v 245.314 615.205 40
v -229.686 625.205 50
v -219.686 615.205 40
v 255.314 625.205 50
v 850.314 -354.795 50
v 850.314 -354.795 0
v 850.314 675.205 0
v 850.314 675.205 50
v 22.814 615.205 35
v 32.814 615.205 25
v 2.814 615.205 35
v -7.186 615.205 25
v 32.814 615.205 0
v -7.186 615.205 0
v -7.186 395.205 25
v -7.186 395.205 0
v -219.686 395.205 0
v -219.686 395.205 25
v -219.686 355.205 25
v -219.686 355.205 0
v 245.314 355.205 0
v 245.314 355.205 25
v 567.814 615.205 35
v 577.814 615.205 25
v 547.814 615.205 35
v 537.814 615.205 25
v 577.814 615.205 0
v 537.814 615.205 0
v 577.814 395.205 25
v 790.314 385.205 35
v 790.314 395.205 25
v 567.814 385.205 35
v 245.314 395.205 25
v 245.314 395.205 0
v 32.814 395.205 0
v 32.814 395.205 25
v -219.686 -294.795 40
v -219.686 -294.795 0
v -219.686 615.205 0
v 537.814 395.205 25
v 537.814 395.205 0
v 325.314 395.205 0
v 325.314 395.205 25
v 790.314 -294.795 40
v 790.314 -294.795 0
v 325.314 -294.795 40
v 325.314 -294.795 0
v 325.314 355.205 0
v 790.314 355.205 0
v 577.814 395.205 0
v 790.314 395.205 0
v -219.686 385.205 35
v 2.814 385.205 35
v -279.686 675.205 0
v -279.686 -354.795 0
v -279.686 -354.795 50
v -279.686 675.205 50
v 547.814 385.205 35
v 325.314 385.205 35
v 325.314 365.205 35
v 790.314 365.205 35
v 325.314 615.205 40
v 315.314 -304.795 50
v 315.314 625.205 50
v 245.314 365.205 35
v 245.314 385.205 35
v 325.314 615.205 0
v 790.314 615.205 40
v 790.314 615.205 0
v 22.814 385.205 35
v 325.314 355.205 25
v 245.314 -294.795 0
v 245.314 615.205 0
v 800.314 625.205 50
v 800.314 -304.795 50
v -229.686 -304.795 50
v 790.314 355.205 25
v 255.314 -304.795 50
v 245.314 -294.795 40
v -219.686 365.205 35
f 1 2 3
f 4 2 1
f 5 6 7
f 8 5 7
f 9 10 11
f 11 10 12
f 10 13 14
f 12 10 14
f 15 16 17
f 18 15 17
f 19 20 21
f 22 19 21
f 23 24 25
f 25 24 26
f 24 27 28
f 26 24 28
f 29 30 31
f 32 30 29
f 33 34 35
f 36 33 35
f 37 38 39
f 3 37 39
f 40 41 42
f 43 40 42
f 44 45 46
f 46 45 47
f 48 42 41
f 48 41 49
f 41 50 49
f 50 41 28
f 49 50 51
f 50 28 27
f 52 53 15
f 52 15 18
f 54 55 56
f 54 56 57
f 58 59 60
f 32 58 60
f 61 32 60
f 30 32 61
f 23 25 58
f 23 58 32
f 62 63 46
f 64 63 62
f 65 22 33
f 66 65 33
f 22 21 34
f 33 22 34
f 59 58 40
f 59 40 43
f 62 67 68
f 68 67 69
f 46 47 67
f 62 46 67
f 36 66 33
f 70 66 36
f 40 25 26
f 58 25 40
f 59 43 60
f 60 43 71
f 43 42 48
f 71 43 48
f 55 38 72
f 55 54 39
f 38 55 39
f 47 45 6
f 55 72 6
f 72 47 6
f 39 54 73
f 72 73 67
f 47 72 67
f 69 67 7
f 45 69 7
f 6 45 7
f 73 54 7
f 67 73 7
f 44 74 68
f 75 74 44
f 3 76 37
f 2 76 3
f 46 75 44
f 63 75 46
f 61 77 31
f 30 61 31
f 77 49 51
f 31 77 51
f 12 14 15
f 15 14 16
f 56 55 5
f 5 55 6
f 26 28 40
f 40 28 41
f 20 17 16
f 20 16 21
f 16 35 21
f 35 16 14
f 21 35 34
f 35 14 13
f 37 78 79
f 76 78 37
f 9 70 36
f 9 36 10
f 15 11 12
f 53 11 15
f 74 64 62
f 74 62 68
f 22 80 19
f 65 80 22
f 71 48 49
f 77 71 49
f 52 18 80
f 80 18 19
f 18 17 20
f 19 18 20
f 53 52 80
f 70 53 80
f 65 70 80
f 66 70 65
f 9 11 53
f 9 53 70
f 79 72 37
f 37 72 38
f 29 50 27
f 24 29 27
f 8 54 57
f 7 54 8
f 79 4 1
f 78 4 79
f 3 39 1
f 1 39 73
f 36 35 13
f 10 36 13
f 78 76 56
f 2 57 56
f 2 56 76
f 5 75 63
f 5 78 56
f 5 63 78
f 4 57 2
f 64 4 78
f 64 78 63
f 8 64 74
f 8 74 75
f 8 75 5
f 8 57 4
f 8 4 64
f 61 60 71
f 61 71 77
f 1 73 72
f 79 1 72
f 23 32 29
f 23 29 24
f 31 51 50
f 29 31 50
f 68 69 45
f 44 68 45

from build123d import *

# Parameters (mm, degrees)
F0_W      = 1130
F0_H      = 1030
F1_DEPTH  = 50
F2_DEPTH  = 35
F3_SIZE   = 10
F3_2_SIZE = 10
F3_3_SIZE = 10


with BuildPart() as f1:
    # F0 (on Top) → F1 (new body)
    with BuildSketch(Plane.XY):
        with Locations((285.3141621128, 160.2047318473)):
            Rectangle(F0_W, F0_H)
        Polygon((-219.6858378872, -294.7952681527), (-219.6858378872, 355.2047318473), (-219.6858378872, 395.2047318473), (-219.6858378872, 615.2047318473), (-7.1858378872, 615.2047318473), (32.8141621128, 615.2047318473), (245.3141621128, 615.2047318473), (245.3141621128, 395.2047318473), (245.3141621128, 355.2047318473), (245.3141621128, -294.7952681527), align=None, mode=Mode.SUBTRACT)
        Polygon((325.3141621128, -294.7952681527), (325.3141621128, 355.2047318473), (325.3141621128, 395.2047318473), (325.3141621128, 615.2047318473), (537.8141621128, 615.2047318473), (577.8141621128, 615.2047318473), (790.3141621128, 615.2047318473), (790.3141621128, 395.2047318473), (790.3141621128, 355.2047318473), (790.3141621128, -294.7952681527), align=None, mode=Mode.SUBTRACT)
    extrude(amount=F1_DEPTH)

    # F3
    f3_edges = [f1.edges().sort_by_distance(p)[0] for p in [
        (-219.685838, 160.204732, 50),
        (12.814162, 615.204732, 50),
        (245.314162, 160.204732, 50),
        (325.314162, 160.204732, 50),
        (557.814162, 615.204732, 50),
        (790.314162, 160.204732, 50),
        (557.814162, -294.795268, 50),
        (12.814162, -294.795268, 50),
    ]]
    chamfer(f3_edges, length=F3_SIZE)


with BuildPart() as f2:
    # F0 (on Top) → F2 (new body)
    with BuildSketch(Plane.XY):
        Polygon((-219.6858378872, 395.2047318473), (-219.6858378872, 355.2047318473), (245.3141621128, 355.2047318473), (245.3141621128, 395.2047318473), (32.8141621128, 395.2047318473), (32.8141621128, 615.2047318473), (-7.1858378872, 615.2047318473), (-7.1858378872, 395.2047318473), align=None)
    extrude(amount=F2_DEPTH)

    # F3#2
    f3_2_edges = [f2.edges().sort_by_distance(p)[0] for p in [
        (12.814162, 355.204732, 35),
        (139.064162, 395.204732, 35),
        (32.814162, 505.204732, 35),
        (-7.185838, 505.204732, 35),
        (-113.435838, 395.204732, 35),
    ]]
    chamfer(f3_2_edges, length=F3_2_SIZE)


with BuildPart() as f2b:
    # F0 (on Top) → F2, piece 2 (new body)
    with BuildSketch(Plane.XY):
        Polygon((325.3141621128, 395.2047318473), (325.3141621128, 355.2047318473), (790.3141621128, 355.2047318473), (790.3141621128, 395.2047318473), (577.8141621128, 395.2047318473), (577.8141621128, 615.2047318473), (537.8141621128, 615.2047318473), (537.8141621128, 395.2047318473), align=None)
    extrude(amount=F2_DEPTH)

    # F3#3
    f3_3_edges = [f2b.edges().sort_by_distance(p)[0] for p in [
        (557.814162, 355.204732, 35),
        (431.564162, 395.204732, 35),
        (577.814162, 505.204732, 35),
        (684.064162, 395.204732, 35),
        (537.814162, 505.204732, 35),
    ]]
    chamfer(f3_3_edges, length=F3_3_SIZE)


solid = Compound([f1.part, f2.part, f2b.part])
